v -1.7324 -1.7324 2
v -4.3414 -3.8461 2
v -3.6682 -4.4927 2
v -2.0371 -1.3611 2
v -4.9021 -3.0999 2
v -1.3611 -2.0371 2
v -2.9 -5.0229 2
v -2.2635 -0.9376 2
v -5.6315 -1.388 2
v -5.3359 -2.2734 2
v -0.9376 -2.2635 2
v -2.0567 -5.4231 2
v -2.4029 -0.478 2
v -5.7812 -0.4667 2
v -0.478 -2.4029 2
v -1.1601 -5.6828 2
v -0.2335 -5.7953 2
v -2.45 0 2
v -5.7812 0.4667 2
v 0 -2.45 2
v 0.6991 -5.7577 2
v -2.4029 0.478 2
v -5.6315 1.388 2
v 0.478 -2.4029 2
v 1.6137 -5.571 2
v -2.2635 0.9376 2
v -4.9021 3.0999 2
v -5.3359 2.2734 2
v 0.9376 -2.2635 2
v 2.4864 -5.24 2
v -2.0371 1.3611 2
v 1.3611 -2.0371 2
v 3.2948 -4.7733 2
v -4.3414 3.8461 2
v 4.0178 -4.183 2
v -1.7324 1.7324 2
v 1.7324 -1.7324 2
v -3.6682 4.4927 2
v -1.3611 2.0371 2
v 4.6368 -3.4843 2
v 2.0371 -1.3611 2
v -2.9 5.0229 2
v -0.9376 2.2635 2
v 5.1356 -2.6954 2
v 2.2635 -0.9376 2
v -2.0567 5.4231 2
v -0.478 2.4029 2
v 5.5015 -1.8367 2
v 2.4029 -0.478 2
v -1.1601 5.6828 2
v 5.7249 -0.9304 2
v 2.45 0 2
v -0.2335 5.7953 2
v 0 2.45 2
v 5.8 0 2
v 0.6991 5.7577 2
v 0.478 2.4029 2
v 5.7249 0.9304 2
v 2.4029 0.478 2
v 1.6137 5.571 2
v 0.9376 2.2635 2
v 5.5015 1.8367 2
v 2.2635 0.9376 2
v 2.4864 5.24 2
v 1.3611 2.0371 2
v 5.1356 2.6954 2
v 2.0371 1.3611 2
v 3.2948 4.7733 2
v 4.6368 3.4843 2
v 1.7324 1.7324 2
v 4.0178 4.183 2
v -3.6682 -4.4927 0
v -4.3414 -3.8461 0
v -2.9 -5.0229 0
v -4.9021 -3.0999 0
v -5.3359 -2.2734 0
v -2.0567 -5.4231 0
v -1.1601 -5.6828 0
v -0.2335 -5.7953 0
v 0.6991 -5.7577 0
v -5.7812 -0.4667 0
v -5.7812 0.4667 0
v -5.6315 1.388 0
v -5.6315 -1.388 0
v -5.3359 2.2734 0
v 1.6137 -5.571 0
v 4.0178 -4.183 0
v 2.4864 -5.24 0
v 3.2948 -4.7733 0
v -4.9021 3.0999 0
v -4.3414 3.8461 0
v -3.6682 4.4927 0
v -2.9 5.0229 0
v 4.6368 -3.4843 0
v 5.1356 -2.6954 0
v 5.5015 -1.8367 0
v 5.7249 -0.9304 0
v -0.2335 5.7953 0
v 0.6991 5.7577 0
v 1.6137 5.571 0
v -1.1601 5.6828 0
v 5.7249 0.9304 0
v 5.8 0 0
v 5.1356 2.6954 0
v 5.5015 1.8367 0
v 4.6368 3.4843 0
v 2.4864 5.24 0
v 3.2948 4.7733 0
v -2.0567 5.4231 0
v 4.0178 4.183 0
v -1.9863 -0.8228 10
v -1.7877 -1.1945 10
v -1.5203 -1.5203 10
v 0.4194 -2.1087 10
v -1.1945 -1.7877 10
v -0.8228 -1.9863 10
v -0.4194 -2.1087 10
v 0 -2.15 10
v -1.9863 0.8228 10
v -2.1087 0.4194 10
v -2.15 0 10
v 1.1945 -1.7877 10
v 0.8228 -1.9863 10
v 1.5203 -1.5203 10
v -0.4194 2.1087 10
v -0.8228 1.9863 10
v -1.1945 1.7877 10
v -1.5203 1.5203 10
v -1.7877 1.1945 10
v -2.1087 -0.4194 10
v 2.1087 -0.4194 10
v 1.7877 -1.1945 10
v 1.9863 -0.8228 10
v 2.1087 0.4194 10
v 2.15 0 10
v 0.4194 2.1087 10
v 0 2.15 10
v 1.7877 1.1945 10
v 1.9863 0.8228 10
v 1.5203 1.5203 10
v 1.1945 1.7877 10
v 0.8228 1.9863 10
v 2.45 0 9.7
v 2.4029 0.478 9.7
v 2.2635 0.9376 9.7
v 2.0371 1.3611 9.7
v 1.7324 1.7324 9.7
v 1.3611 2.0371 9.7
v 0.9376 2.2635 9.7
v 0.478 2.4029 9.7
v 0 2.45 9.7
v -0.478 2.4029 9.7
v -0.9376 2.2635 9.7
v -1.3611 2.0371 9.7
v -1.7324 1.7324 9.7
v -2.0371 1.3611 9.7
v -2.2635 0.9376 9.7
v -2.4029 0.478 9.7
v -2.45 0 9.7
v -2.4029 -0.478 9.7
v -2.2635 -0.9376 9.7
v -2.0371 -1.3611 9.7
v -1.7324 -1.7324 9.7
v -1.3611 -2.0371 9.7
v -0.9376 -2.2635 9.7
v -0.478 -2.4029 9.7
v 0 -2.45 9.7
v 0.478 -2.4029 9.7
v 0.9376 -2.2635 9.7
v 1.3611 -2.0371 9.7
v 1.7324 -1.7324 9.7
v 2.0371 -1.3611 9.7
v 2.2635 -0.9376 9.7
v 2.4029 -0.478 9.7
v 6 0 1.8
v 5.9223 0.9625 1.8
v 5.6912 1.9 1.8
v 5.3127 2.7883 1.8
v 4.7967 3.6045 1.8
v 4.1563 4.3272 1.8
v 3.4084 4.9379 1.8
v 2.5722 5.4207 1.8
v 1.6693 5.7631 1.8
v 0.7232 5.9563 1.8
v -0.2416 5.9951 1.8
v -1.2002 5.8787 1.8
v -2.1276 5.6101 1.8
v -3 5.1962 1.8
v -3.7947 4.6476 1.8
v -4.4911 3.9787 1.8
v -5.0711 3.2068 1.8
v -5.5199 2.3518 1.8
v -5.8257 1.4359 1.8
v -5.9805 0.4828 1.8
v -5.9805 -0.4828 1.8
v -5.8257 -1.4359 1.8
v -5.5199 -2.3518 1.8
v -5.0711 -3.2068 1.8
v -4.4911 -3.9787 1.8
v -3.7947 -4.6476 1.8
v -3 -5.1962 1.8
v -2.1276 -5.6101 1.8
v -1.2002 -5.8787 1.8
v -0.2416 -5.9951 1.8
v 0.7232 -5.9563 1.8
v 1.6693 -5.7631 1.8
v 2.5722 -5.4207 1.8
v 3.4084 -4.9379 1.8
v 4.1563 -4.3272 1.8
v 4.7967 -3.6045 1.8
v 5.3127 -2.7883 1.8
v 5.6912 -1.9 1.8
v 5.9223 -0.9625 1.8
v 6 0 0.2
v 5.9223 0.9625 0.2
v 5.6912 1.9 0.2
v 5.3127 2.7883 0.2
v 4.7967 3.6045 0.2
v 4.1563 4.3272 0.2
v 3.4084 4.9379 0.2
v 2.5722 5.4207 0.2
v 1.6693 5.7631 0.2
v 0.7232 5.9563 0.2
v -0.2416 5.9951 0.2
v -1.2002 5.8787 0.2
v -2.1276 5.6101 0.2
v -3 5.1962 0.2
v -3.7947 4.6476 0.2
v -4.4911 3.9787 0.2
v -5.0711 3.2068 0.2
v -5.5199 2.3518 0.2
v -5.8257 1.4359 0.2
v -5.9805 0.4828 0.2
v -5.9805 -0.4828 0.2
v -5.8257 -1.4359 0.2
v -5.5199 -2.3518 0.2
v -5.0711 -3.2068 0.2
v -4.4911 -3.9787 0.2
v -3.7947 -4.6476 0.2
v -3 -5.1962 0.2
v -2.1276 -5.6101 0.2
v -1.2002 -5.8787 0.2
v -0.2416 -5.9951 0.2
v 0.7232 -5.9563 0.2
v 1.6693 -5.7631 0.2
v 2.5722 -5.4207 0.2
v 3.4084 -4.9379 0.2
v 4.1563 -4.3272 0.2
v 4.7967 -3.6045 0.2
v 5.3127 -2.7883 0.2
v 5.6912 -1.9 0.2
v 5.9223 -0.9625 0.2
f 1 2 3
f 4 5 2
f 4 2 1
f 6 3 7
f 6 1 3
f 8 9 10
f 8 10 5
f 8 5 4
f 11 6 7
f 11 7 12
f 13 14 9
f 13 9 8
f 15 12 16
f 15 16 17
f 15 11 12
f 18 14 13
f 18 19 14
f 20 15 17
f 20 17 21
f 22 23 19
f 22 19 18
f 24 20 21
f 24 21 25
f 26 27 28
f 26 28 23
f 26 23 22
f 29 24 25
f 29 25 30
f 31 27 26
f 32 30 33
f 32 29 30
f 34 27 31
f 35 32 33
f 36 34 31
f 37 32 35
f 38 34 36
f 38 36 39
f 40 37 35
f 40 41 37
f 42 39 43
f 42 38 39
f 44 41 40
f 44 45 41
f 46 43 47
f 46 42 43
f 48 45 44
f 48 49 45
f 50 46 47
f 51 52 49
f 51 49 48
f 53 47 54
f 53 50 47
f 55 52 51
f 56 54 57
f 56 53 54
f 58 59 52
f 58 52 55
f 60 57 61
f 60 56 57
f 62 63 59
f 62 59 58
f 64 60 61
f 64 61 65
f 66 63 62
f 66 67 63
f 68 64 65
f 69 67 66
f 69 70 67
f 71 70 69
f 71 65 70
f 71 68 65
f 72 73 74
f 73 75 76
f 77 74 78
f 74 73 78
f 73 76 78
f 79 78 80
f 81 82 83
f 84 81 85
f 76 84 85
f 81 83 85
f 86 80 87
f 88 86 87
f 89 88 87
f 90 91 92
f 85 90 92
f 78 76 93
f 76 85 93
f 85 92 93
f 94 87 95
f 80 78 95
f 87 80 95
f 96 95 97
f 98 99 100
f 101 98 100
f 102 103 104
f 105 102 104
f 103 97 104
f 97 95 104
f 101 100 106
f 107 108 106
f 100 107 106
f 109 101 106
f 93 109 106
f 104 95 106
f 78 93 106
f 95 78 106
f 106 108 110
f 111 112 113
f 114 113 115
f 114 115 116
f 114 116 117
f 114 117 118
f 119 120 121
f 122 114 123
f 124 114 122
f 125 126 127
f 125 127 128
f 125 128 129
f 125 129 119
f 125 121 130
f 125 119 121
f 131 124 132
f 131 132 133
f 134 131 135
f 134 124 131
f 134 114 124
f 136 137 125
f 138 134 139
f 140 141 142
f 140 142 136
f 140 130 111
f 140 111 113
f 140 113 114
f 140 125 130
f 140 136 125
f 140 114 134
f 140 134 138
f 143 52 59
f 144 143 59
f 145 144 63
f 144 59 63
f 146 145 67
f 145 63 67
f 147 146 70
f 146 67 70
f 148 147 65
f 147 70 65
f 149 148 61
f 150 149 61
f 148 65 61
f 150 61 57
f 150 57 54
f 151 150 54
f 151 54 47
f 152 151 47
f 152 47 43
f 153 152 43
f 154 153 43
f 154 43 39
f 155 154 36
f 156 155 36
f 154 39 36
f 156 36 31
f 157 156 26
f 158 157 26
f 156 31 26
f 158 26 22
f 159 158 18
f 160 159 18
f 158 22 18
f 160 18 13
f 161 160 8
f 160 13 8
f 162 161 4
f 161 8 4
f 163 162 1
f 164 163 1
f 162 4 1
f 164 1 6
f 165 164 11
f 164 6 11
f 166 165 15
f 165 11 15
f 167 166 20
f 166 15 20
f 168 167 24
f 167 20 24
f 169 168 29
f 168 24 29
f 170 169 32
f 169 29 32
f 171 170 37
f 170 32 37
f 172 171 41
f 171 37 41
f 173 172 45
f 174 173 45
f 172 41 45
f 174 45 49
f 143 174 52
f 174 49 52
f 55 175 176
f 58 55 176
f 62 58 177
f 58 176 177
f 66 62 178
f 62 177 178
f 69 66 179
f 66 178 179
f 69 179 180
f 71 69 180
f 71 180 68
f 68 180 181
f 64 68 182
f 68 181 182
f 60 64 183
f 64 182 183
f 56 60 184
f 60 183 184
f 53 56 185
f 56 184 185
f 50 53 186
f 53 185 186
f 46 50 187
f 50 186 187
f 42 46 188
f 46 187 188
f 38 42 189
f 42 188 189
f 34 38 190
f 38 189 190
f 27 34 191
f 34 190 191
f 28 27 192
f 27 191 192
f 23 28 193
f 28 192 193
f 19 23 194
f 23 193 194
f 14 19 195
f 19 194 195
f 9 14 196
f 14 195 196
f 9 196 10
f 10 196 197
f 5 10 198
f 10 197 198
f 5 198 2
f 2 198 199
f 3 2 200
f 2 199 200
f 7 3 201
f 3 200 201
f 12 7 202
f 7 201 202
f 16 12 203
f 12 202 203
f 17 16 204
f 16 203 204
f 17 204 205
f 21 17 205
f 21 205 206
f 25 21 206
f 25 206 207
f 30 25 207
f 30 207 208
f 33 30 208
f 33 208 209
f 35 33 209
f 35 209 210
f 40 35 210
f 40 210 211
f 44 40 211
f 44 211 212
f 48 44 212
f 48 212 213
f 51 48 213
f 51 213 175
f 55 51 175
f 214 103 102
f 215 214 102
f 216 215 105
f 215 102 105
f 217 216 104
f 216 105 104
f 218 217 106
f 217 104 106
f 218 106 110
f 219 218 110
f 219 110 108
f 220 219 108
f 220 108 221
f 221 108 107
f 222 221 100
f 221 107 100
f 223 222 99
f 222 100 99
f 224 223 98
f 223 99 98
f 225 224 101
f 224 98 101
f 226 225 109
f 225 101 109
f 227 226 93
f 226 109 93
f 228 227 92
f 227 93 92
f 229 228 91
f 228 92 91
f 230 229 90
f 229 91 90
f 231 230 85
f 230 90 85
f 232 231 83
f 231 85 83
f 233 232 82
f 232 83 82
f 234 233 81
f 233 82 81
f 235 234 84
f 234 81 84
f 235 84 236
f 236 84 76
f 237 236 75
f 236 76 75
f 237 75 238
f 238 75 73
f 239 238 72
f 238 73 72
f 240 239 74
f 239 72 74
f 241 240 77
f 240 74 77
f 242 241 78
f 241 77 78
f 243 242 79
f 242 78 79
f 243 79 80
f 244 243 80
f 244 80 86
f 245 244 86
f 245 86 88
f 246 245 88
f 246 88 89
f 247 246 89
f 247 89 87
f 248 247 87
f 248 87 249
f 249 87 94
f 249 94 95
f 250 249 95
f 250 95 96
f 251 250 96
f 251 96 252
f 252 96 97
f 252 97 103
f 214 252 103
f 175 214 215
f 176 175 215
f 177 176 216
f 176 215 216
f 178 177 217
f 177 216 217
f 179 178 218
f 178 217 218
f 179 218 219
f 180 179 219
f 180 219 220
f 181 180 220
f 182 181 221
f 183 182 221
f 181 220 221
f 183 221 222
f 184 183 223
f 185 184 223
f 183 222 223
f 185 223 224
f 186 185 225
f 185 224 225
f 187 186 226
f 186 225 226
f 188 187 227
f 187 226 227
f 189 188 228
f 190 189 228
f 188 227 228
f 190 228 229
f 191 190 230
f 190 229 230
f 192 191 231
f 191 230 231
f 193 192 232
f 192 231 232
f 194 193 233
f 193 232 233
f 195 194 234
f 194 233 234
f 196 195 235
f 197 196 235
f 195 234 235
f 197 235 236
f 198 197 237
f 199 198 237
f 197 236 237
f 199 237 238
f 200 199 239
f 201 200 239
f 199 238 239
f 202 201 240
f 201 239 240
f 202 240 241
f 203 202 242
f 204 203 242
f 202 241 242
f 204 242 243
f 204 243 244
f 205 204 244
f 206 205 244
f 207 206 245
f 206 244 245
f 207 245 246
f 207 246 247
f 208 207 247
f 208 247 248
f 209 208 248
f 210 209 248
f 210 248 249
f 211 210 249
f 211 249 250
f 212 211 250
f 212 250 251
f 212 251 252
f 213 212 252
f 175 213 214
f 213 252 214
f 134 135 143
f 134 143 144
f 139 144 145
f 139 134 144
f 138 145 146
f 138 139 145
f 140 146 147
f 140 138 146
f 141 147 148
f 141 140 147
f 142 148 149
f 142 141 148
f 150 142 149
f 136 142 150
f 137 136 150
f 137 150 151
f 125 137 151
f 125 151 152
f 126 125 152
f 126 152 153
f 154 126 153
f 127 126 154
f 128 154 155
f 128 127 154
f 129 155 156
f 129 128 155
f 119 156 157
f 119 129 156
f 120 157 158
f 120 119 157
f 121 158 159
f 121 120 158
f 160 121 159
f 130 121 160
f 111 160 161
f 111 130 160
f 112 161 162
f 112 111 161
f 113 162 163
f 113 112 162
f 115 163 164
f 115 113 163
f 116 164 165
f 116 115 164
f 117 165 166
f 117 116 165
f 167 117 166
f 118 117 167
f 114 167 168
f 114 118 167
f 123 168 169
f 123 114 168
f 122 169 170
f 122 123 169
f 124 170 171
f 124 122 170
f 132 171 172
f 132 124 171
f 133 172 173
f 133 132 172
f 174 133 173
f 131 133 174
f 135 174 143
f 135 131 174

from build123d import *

# Parameters (mm, degrees)
F0_R     = 6
F1_DEPTH = 2
F2_R     = 2.45
F3_DEPTH = 8
F4_SIZE  = 0.3
F5_SIZE  = 0.2


with BuildPart() as f1:
    # F0 (on Top) → F1 (new body)
    with BuildSketch(Plane.XY):
        Circle(F0_R)
    extrude(amount=F1_DEPTH)

    # F2 (on face) → F3 (join)
    with BuildSketch(Plane.XY.offset(2)):
        Circle(F2_R)
    extrude(amount=F3_DEPTH)

    # F4
    f4_edges = [f1.edges().sort_by_distance(p)[0] for p in [
        (-2.45, 0, 10),
    ]]
    chamfer(f4_edges, length=F4_SIZE)

    # F5
    f5_edges = [f1.edges().sort_by_distance(p)[0] for p in [
        (-6, 0, 2),
        (-6, 0, 0),
    ]]
    chamfer(f5_edges, length=F5_SIZE)


solid = f1.part
